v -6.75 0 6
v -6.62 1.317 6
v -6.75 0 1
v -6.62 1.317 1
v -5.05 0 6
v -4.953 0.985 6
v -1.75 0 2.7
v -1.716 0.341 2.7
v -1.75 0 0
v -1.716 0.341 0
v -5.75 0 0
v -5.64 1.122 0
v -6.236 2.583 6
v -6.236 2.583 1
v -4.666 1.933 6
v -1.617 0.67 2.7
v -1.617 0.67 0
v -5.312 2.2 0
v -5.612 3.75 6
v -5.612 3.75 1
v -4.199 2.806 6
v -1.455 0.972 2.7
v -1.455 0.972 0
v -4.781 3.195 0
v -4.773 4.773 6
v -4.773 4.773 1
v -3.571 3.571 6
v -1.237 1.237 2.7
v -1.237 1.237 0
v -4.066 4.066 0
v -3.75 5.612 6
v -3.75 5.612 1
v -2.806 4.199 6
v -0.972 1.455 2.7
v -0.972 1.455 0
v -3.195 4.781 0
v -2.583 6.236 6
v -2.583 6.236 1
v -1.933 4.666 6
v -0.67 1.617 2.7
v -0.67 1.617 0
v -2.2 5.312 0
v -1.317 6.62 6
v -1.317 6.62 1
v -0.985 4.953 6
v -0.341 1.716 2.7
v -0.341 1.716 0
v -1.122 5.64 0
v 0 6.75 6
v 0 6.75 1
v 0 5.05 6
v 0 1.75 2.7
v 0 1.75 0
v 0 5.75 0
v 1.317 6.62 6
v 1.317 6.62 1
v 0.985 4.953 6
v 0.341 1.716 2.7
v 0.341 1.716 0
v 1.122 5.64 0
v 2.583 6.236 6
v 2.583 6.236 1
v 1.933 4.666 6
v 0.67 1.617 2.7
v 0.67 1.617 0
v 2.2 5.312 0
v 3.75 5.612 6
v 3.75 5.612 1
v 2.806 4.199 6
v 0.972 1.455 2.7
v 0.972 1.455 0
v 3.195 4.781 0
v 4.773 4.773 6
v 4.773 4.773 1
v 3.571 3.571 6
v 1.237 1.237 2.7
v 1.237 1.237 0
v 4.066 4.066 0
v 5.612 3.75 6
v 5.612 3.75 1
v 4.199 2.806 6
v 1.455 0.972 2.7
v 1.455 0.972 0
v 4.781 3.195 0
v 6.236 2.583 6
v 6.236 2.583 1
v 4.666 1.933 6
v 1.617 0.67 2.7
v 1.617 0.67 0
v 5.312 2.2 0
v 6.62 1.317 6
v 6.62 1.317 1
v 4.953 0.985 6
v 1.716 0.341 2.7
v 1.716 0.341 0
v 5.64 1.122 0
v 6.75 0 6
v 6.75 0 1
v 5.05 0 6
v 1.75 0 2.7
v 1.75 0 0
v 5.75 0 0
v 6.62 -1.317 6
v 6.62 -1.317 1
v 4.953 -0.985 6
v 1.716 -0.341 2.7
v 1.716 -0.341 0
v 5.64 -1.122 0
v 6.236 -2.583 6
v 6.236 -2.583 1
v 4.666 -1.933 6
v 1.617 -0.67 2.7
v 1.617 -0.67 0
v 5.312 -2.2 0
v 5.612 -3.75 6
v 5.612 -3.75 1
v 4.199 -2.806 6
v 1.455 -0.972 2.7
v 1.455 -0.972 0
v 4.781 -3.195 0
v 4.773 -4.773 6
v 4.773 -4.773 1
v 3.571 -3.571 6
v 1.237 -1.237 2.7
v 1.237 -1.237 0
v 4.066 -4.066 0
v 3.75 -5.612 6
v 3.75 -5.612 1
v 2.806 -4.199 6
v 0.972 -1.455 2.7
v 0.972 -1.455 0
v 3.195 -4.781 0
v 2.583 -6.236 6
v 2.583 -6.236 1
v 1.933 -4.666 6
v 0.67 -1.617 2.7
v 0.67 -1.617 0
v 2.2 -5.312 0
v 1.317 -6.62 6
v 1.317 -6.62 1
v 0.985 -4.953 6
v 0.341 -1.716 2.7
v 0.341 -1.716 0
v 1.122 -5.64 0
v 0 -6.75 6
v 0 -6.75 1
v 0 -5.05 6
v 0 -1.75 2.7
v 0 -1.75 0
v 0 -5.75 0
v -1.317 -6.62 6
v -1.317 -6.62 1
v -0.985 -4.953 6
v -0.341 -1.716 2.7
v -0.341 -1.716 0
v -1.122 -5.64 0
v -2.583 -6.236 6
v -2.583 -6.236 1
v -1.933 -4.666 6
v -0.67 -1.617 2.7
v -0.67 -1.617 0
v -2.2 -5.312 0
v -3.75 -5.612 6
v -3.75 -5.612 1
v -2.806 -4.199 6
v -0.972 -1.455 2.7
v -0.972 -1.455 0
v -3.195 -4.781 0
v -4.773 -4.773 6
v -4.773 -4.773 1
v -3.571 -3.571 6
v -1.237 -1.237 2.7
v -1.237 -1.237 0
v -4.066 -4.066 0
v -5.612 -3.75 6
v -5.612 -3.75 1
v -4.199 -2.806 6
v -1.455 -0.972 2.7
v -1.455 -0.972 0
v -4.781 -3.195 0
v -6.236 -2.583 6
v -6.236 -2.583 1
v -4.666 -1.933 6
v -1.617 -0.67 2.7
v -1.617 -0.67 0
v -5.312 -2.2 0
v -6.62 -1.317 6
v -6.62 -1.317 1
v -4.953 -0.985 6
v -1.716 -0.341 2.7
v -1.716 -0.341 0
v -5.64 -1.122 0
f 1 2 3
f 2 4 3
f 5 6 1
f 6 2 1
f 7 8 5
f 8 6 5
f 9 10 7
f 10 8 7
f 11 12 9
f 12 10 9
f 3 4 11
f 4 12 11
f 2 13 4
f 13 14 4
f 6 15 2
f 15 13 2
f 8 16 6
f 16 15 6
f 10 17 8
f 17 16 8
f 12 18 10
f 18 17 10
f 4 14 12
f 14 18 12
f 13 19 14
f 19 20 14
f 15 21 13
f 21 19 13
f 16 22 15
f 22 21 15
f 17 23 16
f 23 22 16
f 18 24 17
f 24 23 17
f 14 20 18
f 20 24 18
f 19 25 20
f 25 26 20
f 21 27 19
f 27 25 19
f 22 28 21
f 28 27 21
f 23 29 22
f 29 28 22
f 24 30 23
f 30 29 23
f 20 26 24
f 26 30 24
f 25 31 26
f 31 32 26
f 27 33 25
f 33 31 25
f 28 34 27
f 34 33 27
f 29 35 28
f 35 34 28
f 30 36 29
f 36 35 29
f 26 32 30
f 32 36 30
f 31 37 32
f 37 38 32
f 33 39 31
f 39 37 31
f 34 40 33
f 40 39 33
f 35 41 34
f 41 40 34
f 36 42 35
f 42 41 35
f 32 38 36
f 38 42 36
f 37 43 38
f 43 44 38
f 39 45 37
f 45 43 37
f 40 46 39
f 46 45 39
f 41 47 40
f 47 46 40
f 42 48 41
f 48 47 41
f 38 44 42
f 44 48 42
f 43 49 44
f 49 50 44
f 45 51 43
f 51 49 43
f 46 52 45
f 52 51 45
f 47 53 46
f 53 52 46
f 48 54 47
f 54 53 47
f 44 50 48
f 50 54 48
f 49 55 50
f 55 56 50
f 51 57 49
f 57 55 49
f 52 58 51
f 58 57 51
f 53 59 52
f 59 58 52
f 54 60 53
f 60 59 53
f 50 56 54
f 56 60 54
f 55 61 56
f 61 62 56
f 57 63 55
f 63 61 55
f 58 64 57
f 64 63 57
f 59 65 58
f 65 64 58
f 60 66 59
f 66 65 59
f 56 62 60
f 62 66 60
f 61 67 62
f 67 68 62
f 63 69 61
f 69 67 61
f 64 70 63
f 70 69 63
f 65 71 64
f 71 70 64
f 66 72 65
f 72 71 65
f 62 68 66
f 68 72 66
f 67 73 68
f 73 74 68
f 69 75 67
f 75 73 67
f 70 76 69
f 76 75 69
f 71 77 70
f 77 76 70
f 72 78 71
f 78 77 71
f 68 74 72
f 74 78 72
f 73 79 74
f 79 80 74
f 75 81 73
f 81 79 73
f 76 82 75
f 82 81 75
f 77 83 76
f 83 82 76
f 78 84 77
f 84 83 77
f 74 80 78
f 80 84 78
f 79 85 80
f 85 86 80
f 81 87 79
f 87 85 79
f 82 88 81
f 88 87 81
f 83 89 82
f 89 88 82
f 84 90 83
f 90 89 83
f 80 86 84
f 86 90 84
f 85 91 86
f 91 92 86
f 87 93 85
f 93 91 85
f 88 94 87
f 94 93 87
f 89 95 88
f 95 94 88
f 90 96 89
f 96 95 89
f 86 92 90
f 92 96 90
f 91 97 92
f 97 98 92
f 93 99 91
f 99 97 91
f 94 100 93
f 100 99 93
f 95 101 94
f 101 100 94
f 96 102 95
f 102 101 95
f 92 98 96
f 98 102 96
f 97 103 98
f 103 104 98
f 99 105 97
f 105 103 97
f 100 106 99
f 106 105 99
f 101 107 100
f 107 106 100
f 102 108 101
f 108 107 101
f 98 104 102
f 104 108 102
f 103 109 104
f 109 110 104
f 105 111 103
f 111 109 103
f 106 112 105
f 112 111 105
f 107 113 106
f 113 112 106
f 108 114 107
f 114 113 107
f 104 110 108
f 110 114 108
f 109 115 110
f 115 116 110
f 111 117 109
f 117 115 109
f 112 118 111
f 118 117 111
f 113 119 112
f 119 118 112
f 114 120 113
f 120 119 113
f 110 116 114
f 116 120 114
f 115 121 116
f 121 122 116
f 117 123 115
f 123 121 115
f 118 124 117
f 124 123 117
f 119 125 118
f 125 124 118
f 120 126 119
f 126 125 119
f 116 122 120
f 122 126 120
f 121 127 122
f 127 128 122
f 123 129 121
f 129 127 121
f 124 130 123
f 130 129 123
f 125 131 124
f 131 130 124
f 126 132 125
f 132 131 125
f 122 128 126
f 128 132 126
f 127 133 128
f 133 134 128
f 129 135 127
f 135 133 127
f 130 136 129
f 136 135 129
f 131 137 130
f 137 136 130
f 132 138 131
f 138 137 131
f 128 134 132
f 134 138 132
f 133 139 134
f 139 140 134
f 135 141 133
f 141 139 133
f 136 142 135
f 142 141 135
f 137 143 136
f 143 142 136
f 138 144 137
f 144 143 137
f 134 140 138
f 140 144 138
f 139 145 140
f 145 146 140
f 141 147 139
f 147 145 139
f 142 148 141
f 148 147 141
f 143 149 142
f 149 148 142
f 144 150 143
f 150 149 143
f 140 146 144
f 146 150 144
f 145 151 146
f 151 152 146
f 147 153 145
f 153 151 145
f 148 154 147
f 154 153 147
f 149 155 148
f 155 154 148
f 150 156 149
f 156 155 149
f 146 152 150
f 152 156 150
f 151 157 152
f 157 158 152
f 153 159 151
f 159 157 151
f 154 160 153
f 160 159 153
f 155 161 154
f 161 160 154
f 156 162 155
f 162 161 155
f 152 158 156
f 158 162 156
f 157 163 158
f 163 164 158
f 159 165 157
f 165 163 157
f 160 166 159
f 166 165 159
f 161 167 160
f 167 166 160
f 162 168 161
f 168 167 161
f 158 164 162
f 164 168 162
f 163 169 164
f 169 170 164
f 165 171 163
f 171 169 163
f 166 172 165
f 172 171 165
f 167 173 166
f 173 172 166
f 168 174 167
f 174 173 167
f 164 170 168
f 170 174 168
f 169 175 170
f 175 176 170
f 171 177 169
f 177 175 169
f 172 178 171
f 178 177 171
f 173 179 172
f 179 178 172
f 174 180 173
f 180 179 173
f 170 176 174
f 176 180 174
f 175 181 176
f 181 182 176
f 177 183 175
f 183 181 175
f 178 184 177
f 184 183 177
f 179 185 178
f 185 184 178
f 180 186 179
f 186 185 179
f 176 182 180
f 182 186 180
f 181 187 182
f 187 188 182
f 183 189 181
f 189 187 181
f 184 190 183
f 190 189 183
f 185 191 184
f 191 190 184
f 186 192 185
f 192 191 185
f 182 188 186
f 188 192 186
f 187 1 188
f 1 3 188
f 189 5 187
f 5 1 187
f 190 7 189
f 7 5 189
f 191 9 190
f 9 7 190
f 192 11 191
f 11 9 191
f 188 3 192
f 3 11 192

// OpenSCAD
$fn = 32;

// ----------------------------------------------------------------------
// Form washer: countersunk washer, 13.5 mm outside, 3.5 mm bore
// ----------------------------------------------------------------------

// --- parameters (mm) ---
revolve_angle = 360;      // full turn around the Z axis
profile_points = 6;       // points of the closed outline

profile = [[1.75, 0], [5.75, 0], [6.75, 1], [6.75, 6], [5.05, 6], [1.75, 2.7]];  // single closed polygon, 6 points, counter clockwise

// --- the one profile operation ---
rotate_extrude(angle = revolve_angle) polygon(points = profile);
